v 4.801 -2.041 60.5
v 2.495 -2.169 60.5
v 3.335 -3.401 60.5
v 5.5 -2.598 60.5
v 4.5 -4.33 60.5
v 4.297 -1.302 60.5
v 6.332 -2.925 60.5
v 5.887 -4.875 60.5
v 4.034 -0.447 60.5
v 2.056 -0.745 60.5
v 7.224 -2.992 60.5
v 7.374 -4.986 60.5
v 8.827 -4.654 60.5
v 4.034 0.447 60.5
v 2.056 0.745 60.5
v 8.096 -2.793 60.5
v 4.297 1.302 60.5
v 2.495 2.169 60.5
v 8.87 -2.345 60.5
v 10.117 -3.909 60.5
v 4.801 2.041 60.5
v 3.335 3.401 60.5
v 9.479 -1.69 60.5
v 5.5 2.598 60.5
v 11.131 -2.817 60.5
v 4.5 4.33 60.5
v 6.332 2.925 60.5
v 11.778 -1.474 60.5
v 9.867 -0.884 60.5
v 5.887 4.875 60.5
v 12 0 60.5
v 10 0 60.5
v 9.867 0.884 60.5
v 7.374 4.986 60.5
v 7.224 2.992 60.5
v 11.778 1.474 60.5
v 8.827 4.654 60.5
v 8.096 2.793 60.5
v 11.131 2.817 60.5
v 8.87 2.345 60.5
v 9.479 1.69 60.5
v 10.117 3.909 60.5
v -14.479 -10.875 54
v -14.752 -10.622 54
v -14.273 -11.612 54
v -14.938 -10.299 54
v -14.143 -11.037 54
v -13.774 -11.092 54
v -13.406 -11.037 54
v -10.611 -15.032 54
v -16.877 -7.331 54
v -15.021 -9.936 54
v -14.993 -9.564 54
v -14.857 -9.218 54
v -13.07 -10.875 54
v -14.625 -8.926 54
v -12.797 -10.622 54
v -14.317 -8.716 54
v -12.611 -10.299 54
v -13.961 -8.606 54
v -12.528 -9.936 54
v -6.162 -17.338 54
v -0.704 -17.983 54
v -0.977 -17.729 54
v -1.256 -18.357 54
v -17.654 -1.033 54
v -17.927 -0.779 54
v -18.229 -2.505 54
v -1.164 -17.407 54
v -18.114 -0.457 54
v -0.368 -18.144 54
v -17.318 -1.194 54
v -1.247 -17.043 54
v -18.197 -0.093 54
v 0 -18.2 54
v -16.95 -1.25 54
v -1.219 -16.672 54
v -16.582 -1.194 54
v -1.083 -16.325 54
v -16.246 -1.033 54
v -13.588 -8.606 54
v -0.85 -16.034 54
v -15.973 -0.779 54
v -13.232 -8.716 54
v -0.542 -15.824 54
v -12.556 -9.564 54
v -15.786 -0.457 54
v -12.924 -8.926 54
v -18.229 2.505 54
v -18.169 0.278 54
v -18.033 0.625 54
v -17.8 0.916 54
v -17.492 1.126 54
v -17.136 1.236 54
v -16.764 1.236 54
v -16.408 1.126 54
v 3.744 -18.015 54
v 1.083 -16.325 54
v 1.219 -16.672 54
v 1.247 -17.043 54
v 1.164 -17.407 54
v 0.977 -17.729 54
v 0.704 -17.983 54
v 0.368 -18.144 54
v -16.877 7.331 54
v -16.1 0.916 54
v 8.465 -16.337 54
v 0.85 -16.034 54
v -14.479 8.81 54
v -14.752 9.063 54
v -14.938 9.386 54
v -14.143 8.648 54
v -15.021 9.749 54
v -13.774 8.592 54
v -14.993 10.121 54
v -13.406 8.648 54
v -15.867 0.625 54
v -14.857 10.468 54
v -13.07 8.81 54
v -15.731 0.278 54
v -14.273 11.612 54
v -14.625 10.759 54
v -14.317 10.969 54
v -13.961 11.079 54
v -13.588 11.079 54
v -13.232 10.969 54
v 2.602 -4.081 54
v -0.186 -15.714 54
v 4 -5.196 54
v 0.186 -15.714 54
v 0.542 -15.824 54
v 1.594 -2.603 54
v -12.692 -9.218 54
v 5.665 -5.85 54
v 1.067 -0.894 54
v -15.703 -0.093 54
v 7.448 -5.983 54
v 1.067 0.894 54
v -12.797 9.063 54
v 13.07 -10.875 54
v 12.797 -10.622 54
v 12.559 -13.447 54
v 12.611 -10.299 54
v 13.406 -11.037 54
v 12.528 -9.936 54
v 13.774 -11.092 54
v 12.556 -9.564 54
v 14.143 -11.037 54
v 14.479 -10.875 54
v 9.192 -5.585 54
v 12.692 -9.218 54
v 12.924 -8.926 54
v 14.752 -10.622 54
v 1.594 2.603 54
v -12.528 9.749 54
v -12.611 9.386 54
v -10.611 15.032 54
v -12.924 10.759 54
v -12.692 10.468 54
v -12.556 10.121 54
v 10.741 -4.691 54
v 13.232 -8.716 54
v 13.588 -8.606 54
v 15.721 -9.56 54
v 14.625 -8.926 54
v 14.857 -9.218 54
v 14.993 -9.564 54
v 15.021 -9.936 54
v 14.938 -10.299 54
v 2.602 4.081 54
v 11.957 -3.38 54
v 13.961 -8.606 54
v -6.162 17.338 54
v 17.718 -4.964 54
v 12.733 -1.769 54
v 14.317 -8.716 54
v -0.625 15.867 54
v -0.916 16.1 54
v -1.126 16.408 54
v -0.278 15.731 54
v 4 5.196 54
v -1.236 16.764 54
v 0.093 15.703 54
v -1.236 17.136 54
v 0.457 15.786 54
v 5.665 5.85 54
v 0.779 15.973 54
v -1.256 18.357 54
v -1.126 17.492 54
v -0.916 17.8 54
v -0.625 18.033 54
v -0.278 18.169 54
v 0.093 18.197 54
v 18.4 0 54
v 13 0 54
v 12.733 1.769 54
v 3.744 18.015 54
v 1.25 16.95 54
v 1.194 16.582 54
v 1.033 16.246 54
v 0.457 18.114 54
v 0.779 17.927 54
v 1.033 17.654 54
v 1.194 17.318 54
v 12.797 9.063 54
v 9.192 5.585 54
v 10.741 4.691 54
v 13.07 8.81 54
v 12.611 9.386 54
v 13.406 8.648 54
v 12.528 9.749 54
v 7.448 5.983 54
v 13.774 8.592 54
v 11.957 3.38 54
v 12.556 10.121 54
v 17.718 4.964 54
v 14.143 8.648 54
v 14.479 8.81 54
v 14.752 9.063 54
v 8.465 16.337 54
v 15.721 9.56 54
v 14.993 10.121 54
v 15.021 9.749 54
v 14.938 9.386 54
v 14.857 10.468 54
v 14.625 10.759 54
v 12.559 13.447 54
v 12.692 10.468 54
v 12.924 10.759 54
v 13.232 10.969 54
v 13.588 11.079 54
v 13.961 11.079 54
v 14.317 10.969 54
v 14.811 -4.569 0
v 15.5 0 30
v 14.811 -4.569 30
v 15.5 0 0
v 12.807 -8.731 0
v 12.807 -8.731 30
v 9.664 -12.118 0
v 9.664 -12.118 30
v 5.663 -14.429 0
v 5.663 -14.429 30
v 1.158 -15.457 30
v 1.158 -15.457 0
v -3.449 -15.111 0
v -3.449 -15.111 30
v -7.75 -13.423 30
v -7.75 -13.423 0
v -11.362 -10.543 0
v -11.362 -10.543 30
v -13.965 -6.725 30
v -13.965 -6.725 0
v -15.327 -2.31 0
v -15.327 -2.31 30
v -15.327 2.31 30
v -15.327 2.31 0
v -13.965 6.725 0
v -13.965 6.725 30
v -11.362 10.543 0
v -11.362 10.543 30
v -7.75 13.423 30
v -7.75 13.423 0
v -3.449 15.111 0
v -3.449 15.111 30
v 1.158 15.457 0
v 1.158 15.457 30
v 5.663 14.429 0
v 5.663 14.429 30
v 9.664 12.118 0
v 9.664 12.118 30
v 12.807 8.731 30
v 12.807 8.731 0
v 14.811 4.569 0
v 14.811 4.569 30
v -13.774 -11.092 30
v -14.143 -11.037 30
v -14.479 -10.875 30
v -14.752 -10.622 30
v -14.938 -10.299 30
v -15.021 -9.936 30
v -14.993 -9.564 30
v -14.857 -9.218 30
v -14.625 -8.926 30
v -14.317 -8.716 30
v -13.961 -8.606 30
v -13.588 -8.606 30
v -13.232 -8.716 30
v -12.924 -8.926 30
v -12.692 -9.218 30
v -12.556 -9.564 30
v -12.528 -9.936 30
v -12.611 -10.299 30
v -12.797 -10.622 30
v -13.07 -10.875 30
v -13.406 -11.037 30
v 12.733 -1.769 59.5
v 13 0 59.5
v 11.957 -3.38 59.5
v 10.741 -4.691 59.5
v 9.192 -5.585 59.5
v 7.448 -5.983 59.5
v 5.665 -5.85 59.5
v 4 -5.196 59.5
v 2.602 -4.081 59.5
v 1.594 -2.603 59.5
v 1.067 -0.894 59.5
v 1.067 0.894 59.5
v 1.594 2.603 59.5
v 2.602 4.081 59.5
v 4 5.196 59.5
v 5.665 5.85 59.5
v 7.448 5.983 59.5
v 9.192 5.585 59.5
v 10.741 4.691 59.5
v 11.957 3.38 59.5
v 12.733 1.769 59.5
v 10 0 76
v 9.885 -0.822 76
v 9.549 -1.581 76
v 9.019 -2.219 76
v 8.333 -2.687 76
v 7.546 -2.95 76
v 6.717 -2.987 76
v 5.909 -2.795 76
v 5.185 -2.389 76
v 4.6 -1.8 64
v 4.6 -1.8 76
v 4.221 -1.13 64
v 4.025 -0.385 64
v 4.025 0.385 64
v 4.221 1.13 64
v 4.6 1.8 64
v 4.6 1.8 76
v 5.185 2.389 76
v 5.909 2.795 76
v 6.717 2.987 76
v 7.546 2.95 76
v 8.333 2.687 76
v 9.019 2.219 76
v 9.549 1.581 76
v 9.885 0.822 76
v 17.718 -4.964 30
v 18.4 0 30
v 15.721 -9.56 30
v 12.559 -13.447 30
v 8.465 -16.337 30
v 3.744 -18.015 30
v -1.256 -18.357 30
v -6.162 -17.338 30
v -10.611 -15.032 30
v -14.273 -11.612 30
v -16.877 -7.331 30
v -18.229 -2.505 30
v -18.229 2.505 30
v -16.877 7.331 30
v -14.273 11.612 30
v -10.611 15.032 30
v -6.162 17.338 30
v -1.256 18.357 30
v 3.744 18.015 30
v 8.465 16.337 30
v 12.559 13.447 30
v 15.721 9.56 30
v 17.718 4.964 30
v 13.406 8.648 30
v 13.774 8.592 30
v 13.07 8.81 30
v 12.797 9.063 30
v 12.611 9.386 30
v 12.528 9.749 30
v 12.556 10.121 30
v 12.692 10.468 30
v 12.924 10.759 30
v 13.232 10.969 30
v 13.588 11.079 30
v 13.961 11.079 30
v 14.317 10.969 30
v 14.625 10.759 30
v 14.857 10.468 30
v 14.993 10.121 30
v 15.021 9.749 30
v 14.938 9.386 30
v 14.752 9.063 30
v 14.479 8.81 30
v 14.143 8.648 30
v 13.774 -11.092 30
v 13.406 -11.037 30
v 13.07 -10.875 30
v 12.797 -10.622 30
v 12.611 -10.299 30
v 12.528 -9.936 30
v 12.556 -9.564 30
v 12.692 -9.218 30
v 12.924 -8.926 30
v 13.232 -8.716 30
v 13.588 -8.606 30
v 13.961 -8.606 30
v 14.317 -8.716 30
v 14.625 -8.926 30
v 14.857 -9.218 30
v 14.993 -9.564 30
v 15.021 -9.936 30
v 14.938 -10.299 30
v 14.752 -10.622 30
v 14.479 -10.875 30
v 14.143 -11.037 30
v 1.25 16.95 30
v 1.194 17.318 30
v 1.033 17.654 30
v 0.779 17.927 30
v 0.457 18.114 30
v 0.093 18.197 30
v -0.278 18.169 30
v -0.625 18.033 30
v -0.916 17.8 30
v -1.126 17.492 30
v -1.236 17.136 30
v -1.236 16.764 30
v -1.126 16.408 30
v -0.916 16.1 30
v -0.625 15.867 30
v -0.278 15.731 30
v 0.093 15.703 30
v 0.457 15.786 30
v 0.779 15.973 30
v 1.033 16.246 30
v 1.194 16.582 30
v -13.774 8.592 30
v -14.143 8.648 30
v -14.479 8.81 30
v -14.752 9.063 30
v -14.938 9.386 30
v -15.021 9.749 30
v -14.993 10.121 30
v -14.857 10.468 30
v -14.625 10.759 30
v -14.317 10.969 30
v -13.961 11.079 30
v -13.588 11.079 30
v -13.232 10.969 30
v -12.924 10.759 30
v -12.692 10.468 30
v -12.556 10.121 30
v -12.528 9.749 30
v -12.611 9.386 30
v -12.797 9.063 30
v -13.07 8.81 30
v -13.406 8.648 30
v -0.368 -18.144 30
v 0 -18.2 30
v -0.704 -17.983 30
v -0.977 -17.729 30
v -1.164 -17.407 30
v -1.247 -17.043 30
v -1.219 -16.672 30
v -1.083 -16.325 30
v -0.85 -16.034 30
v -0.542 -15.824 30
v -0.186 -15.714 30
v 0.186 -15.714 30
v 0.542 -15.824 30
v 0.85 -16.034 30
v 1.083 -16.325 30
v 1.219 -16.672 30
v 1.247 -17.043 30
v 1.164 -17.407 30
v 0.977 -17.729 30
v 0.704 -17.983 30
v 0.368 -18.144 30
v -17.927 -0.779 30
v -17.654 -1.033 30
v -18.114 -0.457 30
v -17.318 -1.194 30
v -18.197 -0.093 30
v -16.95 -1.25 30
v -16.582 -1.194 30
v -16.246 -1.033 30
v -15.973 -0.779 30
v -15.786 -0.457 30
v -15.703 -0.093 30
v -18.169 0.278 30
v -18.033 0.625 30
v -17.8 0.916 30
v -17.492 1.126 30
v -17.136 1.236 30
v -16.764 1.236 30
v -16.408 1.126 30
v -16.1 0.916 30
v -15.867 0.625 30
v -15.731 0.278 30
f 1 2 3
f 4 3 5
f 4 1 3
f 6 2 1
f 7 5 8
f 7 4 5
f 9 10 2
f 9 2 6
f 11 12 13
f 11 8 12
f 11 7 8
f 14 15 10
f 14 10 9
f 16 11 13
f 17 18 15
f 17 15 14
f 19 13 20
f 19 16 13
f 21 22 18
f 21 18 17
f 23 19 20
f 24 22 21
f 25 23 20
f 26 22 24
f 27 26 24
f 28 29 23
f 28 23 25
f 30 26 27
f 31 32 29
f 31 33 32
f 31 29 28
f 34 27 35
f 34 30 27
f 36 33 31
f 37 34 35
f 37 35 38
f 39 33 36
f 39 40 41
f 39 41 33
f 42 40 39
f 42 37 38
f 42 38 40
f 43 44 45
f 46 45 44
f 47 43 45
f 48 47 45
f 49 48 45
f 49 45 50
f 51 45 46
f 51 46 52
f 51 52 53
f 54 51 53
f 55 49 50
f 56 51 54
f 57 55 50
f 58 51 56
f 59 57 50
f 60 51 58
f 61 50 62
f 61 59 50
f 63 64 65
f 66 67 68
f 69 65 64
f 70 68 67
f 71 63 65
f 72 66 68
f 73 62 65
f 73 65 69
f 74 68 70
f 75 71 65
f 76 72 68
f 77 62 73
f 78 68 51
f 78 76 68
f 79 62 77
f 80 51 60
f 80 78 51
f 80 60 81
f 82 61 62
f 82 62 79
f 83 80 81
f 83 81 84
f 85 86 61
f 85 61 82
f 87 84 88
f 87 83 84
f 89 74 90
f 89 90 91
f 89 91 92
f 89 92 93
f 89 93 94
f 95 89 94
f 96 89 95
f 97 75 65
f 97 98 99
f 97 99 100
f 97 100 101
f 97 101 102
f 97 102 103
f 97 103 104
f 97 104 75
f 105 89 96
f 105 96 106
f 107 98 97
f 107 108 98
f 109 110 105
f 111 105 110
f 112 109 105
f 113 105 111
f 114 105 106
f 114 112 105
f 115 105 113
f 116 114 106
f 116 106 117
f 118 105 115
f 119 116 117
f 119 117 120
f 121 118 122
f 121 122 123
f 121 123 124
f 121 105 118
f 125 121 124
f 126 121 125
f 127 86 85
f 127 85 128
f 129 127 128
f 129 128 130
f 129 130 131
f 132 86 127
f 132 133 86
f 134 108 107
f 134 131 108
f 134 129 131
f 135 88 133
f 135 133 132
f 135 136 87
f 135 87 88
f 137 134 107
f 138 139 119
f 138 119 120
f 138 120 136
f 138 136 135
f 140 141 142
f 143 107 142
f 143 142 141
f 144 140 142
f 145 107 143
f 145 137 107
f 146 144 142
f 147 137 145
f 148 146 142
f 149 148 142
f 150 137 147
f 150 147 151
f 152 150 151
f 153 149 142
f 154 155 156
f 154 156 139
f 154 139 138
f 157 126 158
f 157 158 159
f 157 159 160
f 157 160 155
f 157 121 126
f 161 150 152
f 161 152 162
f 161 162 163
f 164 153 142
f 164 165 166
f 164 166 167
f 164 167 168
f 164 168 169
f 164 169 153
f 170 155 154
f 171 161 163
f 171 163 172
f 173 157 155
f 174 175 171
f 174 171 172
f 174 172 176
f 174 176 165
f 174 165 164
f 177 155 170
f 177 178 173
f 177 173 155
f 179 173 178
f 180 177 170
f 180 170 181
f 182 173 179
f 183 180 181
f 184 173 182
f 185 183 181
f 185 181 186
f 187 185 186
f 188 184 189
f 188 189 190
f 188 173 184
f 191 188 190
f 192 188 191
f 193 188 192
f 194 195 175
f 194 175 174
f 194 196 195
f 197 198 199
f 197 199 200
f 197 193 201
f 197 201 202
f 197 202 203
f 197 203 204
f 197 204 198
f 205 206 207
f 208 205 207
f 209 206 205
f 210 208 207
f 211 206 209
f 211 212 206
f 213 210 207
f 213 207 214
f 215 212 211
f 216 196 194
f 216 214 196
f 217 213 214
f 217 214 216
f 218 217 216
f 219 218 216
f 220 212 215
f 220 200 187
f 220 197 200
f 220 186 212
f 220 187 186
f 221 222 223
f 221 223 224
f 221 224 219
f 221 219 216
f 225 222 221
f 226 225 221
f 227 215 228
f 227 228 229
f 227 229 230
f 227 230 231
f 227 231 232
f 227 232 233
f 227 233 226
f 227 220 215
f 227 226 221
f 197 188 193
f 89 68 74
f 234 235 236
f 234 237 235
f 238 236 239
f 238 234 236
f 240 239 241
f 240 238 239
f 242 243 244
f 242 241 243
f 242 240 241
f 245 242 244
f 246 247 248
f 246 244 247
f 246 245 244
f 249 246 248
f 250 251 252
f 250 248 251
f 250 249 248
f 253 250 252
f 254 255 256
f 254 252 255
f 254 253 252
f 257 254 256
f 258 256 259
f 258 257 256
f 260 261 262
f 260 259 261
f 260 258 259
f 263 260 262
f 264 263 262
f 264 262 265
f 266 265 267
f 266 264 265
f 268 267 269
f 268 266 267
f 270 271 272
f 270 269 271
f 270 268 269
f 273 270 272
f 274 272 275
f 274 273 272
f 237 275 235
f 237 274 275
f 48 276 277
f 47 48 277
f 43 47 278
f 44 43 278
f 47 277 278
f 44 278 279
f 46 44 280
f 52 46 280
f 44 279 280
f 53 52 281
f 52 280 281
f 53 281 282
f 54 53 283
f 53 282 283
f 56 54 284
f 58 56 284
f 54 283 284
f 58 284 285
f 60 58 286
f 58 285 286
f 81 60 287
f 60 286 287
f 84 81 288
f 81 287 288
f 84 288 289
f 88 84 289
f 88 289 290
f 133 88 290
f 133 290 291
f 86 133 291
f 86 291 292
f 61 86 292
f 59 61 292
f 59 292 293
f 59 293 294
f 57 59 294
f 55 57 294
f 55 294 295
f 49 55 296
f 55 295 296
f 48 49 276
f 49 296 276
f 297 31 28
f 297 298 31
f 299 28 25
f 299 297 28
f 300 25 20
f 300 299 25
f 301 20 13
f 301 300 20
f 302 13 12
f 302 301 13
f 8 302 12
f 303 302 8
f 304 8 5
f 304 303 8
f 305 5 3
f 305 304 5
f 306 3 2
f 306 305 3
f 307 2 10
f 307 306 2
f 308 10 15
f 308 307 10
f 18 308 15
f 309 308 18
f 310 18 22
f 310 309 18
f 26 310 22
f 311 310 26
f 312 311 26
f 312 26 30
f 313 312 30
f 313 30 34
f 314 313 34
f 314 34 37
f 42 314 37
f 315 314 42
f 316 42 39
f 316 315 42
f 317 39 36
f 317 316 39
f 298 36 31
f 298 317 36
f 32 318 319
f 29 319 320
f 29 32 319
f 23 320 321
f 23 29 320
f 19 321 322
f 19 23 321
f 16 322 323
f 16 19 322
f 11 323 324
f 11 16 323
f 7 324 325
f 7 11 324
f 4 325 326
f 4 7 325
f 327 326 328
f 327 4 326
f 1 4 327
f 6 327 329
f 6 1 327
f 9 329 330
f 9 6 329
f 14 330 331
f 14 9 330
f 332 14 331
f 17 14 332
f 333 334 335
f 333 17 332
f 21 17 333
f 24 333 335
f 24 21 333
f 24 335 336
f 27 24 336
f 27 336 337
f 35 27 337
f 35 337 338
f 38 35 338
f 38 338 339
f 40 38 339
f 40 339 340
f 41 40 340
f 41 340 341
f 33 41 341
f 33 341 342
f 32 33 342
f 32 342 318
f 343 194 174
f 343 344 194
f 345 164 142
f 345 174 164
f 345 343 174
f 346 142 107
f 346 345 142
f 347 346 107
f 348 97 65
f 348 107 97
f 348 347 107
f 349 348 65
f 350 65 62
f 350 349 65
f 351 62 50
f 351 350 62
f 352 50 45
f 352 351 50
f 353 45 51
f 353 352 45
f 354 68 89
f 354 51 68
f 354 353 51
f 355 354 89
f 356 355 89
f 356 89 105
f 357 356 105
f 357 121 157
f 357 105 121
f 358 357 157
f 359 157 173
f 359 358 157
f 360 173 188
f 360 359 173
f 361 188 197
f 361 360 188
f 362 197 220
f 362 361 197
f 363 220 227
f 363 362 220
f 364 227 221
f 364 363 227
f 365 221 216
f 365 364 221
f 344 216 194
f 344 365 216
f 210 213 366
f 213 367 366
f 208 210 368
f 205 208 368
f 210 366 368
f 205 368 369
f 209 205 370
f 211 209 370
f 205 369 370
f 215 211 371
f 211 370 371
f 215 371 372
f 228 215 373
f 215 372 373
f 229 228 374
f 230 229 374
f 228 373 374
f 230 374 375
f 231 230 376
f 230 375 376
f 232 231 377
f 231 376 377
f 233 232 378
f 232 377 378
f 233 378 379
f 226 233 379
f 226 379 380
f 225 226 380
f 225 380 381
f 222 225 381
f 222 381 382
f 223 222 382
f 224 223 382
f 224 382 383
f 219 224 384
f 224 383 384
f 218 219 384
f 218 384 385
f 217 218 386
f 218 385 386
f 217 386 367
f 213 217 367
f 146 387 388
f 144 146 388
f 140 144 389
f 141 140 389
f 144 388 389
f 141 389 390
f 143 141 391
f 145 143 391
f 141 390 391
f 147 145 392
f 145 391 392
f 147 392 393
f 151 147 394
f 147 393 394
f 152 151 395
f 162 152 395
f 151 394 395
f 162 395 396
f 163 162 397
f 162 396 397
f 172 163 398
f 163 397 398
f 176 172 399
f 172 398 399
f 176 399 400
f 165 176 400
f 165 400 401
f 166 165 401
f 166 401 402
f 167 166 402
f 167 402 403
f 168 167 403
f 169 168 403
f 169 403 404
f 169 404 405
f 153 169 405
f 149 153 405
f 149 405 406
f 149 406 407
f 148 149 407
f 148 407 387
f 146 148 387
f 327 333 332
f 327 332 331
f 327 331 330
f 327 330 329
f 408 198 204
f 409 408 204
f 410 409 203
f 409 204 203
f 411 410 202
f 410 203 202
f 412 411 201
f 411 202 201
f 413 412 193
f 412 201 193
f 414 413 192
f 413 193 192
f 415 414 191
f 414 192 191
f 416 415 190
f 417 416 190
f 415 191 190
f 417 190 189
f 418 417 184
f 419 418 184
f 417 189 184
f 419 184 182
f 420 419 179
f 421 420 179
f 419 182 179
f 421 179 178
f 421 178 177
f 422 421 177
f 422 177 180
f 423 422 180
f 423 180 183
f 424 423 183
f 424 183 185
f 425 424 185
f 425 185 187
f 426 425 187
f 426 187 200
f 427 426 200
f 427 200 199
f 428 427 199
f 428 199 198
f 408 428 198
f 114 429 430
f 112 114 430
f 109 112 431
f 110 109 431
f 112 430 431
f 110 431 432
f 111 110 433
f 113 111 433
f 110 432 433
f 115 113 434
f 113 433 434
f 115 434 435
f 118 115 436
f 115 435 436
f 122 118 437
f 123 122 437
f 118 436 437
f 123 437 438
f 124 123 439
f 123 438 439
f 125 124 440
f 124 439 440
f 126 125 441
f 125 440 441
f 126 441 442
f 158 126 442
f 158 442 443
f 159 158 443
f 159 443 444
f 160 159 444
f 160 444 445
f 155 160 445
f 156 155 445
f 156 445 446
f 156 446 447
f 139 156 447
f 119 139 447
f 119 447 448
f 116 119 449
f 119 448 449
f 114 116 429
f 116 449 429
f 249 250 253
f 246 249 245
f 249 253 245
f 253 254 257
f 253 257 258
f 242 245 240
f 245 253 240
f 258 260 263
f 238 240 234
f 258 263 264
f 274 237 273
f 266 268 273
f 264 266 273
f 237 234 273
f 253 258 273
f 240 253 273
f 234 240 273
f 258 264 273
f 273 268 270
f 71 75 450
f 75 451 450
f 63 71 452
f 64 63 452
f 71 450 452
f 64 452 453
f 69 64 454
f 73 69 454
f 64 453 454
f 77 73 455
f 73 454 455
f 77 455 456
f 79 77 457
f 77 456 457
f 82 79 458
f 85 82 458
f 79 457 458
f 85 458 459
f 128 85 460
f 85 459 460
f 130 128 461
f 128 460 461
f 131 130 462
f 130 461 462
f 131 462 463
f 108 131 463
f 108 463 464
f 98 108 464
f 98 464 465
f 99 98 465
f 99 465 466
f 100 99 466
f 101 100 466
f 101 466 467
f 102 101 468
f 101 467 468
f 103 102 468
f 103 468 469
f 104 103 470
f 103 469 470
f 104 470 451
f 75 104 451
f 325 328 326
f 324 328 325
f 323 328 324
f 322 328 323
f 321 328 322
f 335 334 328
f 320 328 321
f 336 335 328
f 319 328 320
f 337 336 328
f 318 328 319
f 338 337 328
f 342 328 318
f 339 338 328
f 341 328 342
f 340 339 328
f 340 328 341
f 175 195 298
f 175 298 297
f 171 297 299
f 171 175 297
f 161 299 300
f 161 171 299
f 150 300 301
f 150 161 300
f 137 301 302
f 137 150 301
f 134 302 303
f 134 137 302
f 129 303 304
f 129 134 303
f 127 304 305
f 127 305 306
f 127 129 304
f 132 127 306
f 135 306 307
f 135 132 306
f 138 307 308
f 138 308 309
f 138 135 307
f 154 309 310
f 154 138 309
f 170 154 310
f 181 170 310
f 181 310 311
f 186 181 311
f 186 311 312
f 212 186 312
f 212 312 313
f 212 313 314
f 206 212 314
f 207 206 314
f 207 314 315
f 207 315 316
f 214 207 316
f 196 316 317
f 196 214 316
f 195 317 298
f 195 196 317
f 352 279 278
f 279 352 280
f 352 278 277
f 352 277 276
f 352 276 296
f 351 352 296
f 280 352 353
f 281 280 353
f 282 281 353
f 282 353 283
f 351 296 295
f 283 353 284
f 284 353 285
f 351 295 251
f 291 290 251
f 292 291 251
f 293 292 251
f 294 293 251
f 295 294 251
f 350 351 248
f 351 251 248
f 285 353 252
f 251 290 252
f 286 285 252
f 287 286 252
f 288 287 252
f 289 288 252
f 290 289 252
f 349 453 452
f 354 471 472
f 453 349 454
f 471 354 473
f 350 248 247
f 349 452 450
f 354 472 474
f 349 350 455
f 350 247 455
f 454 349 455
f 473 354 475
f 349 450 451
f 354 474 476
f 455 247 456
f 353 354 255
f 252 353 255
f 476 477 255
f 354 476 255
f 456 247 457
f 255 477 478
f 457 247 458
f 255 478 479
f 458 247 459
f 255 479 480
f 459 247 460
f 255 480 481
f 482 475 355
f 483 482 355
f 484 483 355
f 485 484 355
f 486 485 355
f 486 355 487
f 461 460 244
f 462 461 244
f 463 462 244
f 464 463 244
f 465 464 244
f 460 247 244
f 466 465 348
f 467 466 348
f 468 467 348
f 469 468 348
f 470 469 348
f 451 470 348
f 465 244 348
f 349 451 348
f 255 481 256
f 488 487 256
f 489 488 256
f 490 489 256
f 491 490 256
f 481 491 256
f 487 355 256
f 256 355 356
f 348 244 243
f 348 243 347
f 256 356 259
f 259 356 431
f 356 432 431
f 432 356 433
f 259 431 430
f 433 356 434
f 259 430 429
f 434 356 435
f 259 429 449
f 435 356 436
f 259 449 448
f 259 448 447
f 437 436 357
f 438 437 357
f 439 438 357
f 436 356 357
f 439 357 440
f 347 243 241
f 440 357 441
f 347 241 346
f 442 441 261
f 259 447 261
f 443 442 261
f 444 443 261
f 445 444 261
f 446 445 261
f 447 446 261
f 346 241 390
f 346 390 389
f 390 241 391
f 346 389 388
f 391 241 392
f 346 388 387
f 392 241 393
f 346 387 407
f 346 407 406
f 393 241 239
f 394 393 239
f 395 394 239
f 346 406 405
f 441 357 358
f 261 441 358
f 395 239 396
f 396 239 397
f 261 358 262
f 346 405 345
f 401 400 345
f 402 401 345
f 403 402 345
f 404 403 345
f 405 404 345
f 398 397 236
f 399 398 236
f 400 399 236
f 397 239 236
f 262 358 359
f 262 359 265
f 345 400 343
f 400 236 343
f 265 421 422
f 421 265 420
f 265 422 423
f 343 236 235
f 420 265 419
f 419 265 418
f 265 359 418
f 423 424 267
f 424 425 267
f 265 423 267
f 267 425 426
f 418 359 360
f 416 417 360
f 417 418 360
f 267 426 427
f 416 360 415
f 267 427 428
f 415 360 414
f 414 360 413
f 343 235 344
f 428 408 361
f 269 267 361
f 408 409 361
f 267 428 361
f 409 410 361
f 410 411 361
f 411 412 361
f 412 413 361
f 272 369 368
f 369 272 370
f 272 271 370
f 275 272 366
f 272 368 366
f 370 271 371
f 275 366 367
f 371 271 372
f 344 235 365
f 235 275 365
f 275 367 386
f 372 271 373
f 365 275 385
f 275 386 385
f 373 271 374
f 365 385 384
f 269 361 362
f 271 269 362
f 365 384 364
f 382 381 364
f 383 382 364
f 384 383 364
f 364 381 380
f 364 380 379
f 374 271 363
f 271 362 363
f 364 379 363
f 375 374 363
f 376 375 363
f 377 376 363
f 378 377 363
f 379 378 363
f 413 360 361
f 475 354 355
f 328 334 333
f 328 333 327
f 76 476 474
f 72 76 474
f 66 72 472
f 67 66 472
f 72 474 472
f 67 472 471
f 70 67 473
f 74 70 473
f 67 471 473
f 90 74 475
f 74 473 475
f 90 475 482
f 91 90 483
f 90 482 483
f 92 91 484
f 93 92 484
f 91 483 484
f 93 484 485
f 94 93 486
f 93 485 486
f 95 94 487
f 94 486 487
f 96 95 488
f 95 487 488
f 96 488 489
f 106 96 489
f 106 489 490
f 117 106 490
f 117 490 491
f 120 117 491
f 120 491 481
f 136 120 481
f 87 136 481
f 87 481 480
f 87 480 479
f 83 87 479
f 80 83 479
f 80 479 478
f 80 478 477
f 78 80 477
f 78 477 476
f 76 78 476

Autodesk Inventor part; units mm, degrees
ref_plane "YZ Plane" through (0, 0, 0) normal (1, 0, 0) x (0, 1, 0)
ref_plane "XZ Plane" through (0, 0, 0) normal (0, 1, 0) x (-1, 0, 0)
ref_plane "XY Plane" through (0, 0, 0) normal (0, 0, 1) x (1, 0, 0)
sketch "Sketch1" plane through (0, 0, 0) normal (0, 0, 1) x (1, 0, 0)
  circle A0 centre (0, 0) radius 15.5
  dimension "d0" = 31
extrude "Extrusion1" add sketch "Sketch1" along normal blind 30
sketch "Sketch2" plane through (0, 0, 30) normal (0, 0, 1) x (1, 0, 0)
  circle A0 centre (0, 0) radius 18.4
  dimension "d3" = 36.8
extrude "Extrusion2" add sketch "Sketch2" along normal blind 24
sketch "Sketch3" plane through (0, 0, 54) normal (0, 0, 1) x (1, 0, 0)
  line L0 (0, 0) -> (7, 0)
  circle A0 centre (7, 0) radius 3
  circle A1 centre (7, 0) radius 6
  dimension "d6" = 7
  dimension "d7" = 6
  dimension "d8" = 12
extrude "Extrusion3" add sketch "Sketch3" along normal blind 22 contours A0
extrude "Extrusion4" add sketch "Sketch3" along normal blind 6.5
chamfer "Chamfer1" distance 1 angle 45 1 edges at (1, 0, 60.5)
sketch "Sketch4" plane through (7, 0, 76) normal (0, 0, 1) x (1, 0, 0)
  point P0 (-7, 0)
sketch "Sketch5" plane through (7, 0, 76) normal (0, 0, 1) x (1, 0, 0)
  line L0 (0, 0) -> (-2.4, 0)
  line L1 (-2.4, 0) -> (-2.4, -1.7999)
  line L2 (-2.4, 0) -> (-2.4, 1.8068)
  arc A0 (-2.4, 1.8068) -> (-2.4, -1.7999) centre (-0.0145, 0.0034) ccw
  point P0 (-7, 0)
  dimension "d16" = 2.4
extrude "Extrusion5" cut sketch "Sketch5" against normal blind 12
sketch "Sketch6" plane through (4.6, -1.7999, 76) normal (-1, 0, 0) x (0, 0, 1)
  line L0 (-11.9968, 1.7999) -> (-7.9968, 1.7999)
  circle A0 centre (-7.9968, 1.7999) radius 0.5
  point P0 (-76, 1.7999)
  dimension "d19" = 4
  dimension "d20" = 1
sketch "Sketch8" plane through (0, 0, 54) normal (0, 0, 1) x (1, 0, 0)
  point P0 (0, 0)
sketch "Sketch9" plane through (0, 0, 54) normal (0, 0, 1) x (1, 0, 0)
  line L0 (0, 0) -> (0, 16.95)
  circle A0 centre (0, 16.95) radius 1.25
  line L1 (0, 0) -> (0, -16.95)
  circle A1 centre (0, -16.95) radius 1.25
  line L2 (0, 0) -> (-16.95, 0)
  circle A2 centre (-16.95, 0) radius 1.25
  line L3 (0, -16.95) -> (-13.7744, -9.8425)
  circle A3 centre (-13.7744, -9.8425) radius 1.25
  circle A4 centre (-13.7744, 9.8425) radius 1.25
  line L4 (0, 16.95) -> (-13.7744, 9.8425)
  line L5 (-13.7744, -9.8425) -> (-13.7744, 9.8425)
  line L6 (0, -16.95) -> (13.7744, -9.8425)
  circle A5 centre (13.7744, -9.8425) radius 1.25
  line L7 (0, 16.95) -> (13.7744, 9.8425)
  circle A6 centre (13.7744, 9.8425) radius 1.25
  line L8 (0, 0) -> (13.7744, 0)
  line L9 (13.7744, 0) -> (13.7744, -9.8425)
  dimension "d49" = 16.95
  dimension "d50" = 2.5
  dimension "d51" = 16.95
  dimension "d52" = 2.5
  dimension "d66" = 16.95
  dimension "d67" = 2.5
  dimension "d68" = 15.5
  dimension "d69" = 2.5
  dimension "d71" = 2.5
  dimension "d72" = 15.5
  dimension "d116" = 2.5
  dimension "d117" = 2.5
hole "Hole2" at (0, -16.95, 54) direction (0, 0, -1) diameter 2.5 end through all
extrude "Extrusion9" cut sketch "Sketch9" against normal through all contours A0 L4 L0 | L0 L7 A0 | L4 A0 L7
thread "Thread5" size "M3x0.5" class "6H" standard "ANSI Metric M Profile" full length
thread "Thread6" size "M3x0.5" class "6H" standard "ANSI Metric M Profile" full length
hole "Hole3" at (-13.7744, -9.8425, 54) direction (0, 0, -1) diameter 2.5 end through all
hole "Hole4" at (-13.7744, 9.8425, 54) direction (0, 0, -1) diameter 2.5 end through all
thread "Thread7" size "M3x0.5" class "6H" standard "ANSI Metric M Profile" full length
thread "Thread8" size "M3x0.5" class "6H" standard "ANSI Metric M Profile" full length
hole "Hole7" at (-16.95, 0, 54) direction (0, 0, -1) diameter 2.5 end through all
thread "Thread9" size "M3x0.5" class "6H" standard "ANSI Metric M Profile" length 10
hole "Hole8" at (13.7744, -9.8425, 54) direction (0, 0, -1) diameter 2.5 end through all
hole "Hole9" at (13.7744, 9.8425, 54) direction (0, 0, -1) diameter 2.5 end through all
thread "Thread10" size "M3x0.5" class "6H" standard "ANSI Metric M Profile" full length
thread "Thread11" size "M2.5x0.45" class "6H" standard "ANSI Metric M Profile" full length
thread "Thread12" size "M3x0.5" class "6H" standard "ANSI Metric M Profile" full length
equation "\"d58\" = Thickness"
equation "\"d78\" = Thickness"
equation "\"d85\" = Thickness"
equation "\"d110\" = Thickness"
equation "\"d123\" = Thickness"
equation "\"d130\" = Thickness"
equation "\"BendRadius\" = Thickness"
equation "\"BendReliefWidth\" = Thickness"
equation "\"BendReliefDepth\" = 0.5 * Thickness"
equation "\"CornerReliefSize\" = 4 * Thickness"
equation "\"MinimumRemnant\" = 2 * Thickness"
equation "\"TransitionRadius\" = BendRadius"
equation "\"JacobiRadiusSize\" = BendRadius"
equation "\"GapSize\" = Thickness"
equation "\"Thickness\" = 0.5"
properties part number "motor_polulu"
